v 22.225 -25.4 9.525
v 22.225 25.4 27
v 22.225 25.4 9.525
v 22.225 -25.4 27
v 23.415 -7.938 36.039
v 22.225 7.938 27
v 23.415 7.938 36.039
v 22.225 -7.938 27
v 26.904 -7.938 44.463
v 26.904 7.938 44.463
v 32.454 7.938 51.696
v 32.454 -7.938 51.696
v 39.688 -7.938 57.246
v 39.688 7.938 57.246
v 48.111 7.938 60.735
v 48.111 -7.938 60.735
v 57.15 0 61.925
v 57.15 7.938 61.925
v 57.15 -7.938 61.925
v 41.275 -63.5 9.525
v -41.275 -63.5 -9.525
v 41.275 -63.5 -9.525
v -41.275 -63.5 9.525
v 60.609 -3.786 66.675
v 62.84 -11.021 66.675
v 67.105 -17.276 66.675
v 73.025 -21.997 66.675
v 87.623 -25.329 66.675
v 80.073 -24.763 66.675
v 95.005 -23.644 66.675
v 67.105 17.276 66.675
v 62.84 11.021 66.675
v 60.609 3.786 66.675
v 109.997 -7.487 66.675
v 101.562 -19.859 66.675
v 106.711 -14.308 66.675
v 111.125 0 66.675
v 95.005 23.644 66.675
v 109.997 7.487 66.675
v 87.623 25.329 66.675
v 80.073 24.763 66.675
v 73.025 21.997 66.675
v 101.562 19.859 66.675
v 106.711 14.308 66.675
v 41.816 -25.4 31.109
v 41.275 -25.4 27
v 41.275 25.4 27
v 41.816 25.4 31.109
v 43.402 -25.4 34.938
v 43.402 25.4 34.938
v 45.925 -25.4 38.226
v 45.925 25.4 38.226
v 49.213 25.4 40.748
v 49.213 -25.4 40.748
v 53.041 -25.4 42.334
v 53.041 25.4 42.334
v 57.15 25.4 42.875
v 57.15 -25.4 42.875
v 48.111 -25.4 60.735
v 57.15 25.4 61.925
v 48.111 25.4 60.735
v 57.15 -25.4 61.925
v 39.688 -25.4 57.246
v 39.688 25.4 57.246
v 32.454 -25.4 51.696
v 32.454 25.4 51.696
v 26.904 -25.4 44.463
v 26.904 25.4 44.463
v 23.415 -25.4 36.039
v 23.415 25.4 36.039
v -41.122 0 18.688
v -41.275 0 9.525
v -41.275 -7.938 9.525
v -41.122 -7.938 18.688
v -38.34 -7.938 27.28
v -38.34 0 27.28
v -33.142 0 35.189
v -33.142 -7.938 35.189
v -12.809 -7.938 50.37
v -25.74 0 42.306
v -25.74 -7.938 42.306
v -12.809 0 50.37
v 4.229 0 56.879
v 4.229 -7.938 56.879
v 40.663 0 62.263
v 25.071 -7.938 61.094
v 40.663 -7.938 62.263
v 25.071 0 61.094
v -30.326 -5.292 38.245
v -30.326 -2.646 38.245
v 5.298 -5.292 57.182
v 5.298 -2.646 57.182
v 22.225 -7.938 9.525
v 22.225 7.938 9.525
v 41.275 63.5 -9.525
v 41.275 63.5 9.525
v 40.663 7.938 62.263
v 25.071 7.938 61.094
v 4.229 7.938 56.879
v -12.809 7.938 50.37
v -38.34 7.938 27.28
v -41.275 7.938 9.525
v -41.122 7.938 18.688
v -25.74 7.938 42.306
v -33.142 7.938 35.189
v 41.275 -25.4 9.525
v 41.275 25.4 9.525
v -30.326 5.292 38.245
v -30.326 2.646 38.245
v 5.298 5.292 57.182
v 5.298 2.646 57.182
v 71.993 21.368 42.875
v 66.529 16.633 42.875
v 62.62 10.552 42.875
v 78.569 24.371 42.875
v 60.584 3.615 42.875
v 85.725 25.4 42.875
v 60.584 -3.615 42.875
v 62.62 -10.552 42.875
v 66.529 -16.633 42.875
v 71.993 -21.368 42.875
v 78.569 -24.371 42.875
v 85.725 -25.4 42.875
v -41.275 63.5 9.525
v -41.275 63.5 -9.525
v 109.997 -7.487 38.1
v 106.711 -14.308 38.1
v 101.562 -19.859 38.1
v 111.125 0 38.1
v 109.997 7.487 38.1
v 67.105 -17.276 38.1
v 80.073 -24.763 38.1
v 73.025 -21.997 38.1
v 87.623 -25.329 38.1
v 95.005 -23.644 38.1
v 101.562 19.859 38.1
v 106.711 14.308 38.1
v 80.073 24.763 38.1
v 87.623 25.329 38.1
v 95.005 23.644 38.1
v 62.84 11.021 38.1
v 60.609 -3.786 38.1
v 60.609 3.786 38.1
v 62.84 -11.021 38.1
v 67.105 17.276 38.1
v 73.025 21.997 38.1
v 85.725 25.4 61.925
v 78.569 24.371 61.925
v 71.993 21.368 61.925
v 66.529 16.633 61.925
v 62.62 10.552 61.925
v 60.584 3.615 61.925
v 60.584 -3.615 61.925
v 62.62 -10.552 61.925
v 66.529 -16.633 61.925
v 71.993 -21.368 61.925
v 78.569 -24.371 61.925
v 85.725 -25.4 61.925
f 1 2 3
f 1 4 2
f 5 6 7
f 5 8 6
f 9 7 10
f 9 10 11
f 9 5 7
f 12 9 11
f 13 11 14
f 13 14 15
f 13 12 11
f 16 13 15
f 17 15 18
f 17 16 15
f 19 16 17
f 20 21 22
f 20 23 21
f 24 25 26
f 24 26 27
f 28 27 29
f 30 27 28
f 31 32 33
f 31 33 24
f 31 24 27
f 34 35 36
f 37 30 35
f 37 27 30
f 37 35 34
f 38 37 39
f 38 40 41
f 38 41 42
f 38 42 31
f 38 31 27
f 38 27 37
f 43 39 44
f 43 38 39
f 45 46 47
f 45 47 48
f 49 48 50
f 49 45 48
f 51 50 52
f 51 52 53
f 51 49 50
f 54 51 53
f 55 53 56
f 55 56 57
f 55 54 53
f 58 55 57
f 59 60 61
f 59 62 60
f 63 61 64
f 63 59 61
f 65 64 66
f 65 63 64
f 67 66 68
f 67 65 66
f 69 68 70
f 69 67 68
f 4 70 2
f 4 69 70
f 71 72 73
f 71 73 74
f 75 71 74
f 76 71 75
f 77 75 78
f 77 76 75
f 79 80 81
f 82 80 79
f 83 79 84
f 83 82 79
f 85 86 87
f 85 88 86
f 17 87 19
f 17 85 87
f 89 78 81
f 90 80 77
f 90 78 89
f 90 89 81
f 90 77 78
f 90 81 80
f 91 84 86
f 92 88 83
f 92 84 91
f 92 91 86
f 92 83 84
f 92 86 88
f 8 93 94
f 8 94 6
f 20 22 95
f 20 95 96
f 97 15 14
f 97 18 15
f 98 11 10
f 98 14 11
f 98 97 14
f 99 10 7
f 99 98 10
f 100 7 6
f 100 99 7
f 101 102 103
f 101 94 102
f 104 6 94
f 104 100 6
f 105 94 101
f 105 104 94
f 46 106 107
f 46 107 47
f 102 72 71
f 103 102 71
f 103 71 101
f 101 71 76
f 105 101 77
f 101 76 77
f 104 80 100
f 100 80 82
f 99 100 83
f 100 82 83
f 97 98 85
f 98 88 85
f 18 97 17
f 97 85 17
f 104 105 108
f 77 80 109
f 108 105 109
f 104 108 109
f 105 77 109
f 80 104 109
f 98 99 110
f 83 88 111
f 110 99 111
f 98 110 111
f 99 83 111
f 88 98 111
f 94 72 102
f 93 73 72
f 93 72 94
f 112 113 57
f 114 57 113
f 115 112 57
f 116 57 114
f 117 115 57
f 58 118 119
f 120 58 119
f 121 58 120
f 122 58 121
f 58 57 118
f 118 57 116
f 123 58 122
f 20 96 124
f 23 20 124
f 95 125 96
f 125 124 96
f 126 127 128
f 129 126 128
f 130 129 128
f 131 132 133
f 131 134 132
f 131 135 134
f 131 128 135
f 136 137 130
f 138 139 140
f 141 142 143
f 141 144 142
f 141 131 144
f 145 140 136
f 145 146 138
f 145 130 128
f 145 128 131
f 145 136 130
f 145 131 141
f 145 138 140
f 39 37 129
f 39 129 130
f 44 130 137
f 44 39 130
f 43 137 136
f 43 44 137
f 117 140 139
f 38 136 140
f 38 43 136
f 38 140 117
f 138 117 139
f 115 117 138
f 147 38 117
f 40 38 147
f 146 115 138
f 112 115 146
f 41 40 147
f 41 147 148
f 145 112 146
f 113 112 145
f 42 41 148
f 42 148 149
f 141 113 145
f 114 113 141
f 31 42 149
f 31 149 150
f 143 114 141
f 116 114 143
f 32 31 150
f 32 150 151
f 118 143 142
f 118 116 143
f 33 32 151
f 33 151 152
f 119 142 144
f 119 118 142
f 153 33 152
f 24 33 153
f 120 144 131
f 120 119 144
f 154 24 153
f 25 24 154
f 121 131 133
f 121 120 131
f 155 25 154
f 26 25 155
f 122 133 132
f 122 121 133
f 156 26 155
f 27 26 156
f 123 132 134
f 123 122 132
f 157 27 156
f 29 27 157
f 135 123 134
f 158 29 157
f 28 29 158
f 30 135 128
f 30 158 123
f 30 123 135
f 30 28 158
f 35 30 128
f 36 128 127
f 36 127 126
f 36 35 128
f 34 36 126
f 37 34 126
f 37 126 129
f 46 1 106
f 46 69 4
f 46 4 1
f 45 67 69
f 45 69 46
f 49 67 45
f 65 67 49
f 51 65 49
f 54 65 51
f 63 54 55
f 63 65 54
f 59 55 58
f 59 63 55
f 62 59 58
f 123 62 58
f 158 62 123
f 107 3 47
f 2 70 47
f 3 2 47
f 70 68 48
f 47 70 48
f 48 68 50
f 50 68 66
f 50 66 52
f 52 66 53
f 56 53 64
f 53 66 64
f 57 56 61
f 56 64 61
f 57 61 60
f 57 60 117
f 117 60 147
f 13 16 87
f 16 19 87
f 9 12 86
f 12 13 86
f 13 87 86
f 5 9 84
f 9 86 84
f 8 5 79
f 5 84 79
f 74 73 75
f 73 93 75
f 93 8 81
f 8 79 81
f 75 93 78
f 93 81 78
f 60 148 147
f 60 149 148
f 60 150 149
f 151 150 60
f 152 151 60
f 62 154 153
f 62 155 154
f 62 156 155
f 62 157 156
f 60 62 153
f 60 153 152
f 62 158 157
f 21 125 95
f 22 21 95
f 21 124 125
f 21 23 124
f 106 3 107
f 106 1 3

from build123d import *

# Parameters (mm, degrees)
F1_DEPTH = 63.5
F0_W     = 25.4
F0_H     = 19.05
F2_DEPTH = 25.4
F3_DEPTH = 7.9375


with BuildPart() as f1:
    # F0 (on Front) → F1 (new body, symmetric)
    with BuildSketch(Plane.XZ):
        Polygon((-41.275, -9.525), (41.275, -9.525), (41.275, 9.525), (22.225, 9.525), (-41.275, 9.525), align=None)
    extrude(amount=F1_DEPTH, both=True)


with BuildPart() as f2:
    # F0 (on Front) → F2 (new body, symmetric)
    with BuildSketch(Plane.XZ):
        with BuildLine():
            Line((22.225, 9.525), (41.275, 9.525))
            Line((41.275, 9.525), (41.275, 27.0002))
            ThreePointArc((41.275, 27.0002), (45.9246798487, 38.2255201513), (57.15, 42.8752))
            Line((57.15, 42.8752), (60.325, 42.8752))
            Line((60.325, 42.8752), (60.325, 61.9252))
            Line((60.325, 61.9252), (57.15, 61.9252))
            ThreePointArc((57.15, 61.9252), (32.4542956671, 51.6959043329), (22.225, 27.0002))
            Line((22.225, 27.0002), (22.225, 9.525))
        make_face()
        with Locations((73.025, 52.4002)):
            Rectangle(F0_W, F0_H)
    extrude(amount=F2_DEPTH, both=True)

    # F0 (on Front) → F4 (revolve)
    with BuildSketch(Plane.XZ):
        Polygon((85.725, 66.675), (85.725, 61.9252), (85.725, 42.8752), (85.725, 38.1), (111.125, 38.1), (111.125, 66.675), align=None)
    revolve(axis=Axis((85.725, 0, 52.3875), (0, 0, 1)))


with BuildPart() as f3:
    # F0 (on Front) → F3 (new body, symmetric)
    with BuildSketch(Plane.XZ):
        with BuildLine():
            add(Edge.make_bspline(
                [(-41.275, 9.525), (-45.4798899591, 41.6644178331), (0, 65.7511204481), (57.15, 61.9252)],
                knots=[0, 0, 0, 0, 111.5045361635, 111.5045361635, 111.5045361635, 111.5045361635], degree=3))
            Line((-41.275, 9.525), (22.225, 9.525))
            Line((22.225, 9.525), (22.225, 27.0002))
            ThreePointArc((22.225, 27.0002), (32.4542956671, 51.6959043329), (57.15, 61.9252))
        make_face()
    extrude(amount=F3_DEPTH, both=True)


solid = Compound([f1.part, f2.part, f3.part])
